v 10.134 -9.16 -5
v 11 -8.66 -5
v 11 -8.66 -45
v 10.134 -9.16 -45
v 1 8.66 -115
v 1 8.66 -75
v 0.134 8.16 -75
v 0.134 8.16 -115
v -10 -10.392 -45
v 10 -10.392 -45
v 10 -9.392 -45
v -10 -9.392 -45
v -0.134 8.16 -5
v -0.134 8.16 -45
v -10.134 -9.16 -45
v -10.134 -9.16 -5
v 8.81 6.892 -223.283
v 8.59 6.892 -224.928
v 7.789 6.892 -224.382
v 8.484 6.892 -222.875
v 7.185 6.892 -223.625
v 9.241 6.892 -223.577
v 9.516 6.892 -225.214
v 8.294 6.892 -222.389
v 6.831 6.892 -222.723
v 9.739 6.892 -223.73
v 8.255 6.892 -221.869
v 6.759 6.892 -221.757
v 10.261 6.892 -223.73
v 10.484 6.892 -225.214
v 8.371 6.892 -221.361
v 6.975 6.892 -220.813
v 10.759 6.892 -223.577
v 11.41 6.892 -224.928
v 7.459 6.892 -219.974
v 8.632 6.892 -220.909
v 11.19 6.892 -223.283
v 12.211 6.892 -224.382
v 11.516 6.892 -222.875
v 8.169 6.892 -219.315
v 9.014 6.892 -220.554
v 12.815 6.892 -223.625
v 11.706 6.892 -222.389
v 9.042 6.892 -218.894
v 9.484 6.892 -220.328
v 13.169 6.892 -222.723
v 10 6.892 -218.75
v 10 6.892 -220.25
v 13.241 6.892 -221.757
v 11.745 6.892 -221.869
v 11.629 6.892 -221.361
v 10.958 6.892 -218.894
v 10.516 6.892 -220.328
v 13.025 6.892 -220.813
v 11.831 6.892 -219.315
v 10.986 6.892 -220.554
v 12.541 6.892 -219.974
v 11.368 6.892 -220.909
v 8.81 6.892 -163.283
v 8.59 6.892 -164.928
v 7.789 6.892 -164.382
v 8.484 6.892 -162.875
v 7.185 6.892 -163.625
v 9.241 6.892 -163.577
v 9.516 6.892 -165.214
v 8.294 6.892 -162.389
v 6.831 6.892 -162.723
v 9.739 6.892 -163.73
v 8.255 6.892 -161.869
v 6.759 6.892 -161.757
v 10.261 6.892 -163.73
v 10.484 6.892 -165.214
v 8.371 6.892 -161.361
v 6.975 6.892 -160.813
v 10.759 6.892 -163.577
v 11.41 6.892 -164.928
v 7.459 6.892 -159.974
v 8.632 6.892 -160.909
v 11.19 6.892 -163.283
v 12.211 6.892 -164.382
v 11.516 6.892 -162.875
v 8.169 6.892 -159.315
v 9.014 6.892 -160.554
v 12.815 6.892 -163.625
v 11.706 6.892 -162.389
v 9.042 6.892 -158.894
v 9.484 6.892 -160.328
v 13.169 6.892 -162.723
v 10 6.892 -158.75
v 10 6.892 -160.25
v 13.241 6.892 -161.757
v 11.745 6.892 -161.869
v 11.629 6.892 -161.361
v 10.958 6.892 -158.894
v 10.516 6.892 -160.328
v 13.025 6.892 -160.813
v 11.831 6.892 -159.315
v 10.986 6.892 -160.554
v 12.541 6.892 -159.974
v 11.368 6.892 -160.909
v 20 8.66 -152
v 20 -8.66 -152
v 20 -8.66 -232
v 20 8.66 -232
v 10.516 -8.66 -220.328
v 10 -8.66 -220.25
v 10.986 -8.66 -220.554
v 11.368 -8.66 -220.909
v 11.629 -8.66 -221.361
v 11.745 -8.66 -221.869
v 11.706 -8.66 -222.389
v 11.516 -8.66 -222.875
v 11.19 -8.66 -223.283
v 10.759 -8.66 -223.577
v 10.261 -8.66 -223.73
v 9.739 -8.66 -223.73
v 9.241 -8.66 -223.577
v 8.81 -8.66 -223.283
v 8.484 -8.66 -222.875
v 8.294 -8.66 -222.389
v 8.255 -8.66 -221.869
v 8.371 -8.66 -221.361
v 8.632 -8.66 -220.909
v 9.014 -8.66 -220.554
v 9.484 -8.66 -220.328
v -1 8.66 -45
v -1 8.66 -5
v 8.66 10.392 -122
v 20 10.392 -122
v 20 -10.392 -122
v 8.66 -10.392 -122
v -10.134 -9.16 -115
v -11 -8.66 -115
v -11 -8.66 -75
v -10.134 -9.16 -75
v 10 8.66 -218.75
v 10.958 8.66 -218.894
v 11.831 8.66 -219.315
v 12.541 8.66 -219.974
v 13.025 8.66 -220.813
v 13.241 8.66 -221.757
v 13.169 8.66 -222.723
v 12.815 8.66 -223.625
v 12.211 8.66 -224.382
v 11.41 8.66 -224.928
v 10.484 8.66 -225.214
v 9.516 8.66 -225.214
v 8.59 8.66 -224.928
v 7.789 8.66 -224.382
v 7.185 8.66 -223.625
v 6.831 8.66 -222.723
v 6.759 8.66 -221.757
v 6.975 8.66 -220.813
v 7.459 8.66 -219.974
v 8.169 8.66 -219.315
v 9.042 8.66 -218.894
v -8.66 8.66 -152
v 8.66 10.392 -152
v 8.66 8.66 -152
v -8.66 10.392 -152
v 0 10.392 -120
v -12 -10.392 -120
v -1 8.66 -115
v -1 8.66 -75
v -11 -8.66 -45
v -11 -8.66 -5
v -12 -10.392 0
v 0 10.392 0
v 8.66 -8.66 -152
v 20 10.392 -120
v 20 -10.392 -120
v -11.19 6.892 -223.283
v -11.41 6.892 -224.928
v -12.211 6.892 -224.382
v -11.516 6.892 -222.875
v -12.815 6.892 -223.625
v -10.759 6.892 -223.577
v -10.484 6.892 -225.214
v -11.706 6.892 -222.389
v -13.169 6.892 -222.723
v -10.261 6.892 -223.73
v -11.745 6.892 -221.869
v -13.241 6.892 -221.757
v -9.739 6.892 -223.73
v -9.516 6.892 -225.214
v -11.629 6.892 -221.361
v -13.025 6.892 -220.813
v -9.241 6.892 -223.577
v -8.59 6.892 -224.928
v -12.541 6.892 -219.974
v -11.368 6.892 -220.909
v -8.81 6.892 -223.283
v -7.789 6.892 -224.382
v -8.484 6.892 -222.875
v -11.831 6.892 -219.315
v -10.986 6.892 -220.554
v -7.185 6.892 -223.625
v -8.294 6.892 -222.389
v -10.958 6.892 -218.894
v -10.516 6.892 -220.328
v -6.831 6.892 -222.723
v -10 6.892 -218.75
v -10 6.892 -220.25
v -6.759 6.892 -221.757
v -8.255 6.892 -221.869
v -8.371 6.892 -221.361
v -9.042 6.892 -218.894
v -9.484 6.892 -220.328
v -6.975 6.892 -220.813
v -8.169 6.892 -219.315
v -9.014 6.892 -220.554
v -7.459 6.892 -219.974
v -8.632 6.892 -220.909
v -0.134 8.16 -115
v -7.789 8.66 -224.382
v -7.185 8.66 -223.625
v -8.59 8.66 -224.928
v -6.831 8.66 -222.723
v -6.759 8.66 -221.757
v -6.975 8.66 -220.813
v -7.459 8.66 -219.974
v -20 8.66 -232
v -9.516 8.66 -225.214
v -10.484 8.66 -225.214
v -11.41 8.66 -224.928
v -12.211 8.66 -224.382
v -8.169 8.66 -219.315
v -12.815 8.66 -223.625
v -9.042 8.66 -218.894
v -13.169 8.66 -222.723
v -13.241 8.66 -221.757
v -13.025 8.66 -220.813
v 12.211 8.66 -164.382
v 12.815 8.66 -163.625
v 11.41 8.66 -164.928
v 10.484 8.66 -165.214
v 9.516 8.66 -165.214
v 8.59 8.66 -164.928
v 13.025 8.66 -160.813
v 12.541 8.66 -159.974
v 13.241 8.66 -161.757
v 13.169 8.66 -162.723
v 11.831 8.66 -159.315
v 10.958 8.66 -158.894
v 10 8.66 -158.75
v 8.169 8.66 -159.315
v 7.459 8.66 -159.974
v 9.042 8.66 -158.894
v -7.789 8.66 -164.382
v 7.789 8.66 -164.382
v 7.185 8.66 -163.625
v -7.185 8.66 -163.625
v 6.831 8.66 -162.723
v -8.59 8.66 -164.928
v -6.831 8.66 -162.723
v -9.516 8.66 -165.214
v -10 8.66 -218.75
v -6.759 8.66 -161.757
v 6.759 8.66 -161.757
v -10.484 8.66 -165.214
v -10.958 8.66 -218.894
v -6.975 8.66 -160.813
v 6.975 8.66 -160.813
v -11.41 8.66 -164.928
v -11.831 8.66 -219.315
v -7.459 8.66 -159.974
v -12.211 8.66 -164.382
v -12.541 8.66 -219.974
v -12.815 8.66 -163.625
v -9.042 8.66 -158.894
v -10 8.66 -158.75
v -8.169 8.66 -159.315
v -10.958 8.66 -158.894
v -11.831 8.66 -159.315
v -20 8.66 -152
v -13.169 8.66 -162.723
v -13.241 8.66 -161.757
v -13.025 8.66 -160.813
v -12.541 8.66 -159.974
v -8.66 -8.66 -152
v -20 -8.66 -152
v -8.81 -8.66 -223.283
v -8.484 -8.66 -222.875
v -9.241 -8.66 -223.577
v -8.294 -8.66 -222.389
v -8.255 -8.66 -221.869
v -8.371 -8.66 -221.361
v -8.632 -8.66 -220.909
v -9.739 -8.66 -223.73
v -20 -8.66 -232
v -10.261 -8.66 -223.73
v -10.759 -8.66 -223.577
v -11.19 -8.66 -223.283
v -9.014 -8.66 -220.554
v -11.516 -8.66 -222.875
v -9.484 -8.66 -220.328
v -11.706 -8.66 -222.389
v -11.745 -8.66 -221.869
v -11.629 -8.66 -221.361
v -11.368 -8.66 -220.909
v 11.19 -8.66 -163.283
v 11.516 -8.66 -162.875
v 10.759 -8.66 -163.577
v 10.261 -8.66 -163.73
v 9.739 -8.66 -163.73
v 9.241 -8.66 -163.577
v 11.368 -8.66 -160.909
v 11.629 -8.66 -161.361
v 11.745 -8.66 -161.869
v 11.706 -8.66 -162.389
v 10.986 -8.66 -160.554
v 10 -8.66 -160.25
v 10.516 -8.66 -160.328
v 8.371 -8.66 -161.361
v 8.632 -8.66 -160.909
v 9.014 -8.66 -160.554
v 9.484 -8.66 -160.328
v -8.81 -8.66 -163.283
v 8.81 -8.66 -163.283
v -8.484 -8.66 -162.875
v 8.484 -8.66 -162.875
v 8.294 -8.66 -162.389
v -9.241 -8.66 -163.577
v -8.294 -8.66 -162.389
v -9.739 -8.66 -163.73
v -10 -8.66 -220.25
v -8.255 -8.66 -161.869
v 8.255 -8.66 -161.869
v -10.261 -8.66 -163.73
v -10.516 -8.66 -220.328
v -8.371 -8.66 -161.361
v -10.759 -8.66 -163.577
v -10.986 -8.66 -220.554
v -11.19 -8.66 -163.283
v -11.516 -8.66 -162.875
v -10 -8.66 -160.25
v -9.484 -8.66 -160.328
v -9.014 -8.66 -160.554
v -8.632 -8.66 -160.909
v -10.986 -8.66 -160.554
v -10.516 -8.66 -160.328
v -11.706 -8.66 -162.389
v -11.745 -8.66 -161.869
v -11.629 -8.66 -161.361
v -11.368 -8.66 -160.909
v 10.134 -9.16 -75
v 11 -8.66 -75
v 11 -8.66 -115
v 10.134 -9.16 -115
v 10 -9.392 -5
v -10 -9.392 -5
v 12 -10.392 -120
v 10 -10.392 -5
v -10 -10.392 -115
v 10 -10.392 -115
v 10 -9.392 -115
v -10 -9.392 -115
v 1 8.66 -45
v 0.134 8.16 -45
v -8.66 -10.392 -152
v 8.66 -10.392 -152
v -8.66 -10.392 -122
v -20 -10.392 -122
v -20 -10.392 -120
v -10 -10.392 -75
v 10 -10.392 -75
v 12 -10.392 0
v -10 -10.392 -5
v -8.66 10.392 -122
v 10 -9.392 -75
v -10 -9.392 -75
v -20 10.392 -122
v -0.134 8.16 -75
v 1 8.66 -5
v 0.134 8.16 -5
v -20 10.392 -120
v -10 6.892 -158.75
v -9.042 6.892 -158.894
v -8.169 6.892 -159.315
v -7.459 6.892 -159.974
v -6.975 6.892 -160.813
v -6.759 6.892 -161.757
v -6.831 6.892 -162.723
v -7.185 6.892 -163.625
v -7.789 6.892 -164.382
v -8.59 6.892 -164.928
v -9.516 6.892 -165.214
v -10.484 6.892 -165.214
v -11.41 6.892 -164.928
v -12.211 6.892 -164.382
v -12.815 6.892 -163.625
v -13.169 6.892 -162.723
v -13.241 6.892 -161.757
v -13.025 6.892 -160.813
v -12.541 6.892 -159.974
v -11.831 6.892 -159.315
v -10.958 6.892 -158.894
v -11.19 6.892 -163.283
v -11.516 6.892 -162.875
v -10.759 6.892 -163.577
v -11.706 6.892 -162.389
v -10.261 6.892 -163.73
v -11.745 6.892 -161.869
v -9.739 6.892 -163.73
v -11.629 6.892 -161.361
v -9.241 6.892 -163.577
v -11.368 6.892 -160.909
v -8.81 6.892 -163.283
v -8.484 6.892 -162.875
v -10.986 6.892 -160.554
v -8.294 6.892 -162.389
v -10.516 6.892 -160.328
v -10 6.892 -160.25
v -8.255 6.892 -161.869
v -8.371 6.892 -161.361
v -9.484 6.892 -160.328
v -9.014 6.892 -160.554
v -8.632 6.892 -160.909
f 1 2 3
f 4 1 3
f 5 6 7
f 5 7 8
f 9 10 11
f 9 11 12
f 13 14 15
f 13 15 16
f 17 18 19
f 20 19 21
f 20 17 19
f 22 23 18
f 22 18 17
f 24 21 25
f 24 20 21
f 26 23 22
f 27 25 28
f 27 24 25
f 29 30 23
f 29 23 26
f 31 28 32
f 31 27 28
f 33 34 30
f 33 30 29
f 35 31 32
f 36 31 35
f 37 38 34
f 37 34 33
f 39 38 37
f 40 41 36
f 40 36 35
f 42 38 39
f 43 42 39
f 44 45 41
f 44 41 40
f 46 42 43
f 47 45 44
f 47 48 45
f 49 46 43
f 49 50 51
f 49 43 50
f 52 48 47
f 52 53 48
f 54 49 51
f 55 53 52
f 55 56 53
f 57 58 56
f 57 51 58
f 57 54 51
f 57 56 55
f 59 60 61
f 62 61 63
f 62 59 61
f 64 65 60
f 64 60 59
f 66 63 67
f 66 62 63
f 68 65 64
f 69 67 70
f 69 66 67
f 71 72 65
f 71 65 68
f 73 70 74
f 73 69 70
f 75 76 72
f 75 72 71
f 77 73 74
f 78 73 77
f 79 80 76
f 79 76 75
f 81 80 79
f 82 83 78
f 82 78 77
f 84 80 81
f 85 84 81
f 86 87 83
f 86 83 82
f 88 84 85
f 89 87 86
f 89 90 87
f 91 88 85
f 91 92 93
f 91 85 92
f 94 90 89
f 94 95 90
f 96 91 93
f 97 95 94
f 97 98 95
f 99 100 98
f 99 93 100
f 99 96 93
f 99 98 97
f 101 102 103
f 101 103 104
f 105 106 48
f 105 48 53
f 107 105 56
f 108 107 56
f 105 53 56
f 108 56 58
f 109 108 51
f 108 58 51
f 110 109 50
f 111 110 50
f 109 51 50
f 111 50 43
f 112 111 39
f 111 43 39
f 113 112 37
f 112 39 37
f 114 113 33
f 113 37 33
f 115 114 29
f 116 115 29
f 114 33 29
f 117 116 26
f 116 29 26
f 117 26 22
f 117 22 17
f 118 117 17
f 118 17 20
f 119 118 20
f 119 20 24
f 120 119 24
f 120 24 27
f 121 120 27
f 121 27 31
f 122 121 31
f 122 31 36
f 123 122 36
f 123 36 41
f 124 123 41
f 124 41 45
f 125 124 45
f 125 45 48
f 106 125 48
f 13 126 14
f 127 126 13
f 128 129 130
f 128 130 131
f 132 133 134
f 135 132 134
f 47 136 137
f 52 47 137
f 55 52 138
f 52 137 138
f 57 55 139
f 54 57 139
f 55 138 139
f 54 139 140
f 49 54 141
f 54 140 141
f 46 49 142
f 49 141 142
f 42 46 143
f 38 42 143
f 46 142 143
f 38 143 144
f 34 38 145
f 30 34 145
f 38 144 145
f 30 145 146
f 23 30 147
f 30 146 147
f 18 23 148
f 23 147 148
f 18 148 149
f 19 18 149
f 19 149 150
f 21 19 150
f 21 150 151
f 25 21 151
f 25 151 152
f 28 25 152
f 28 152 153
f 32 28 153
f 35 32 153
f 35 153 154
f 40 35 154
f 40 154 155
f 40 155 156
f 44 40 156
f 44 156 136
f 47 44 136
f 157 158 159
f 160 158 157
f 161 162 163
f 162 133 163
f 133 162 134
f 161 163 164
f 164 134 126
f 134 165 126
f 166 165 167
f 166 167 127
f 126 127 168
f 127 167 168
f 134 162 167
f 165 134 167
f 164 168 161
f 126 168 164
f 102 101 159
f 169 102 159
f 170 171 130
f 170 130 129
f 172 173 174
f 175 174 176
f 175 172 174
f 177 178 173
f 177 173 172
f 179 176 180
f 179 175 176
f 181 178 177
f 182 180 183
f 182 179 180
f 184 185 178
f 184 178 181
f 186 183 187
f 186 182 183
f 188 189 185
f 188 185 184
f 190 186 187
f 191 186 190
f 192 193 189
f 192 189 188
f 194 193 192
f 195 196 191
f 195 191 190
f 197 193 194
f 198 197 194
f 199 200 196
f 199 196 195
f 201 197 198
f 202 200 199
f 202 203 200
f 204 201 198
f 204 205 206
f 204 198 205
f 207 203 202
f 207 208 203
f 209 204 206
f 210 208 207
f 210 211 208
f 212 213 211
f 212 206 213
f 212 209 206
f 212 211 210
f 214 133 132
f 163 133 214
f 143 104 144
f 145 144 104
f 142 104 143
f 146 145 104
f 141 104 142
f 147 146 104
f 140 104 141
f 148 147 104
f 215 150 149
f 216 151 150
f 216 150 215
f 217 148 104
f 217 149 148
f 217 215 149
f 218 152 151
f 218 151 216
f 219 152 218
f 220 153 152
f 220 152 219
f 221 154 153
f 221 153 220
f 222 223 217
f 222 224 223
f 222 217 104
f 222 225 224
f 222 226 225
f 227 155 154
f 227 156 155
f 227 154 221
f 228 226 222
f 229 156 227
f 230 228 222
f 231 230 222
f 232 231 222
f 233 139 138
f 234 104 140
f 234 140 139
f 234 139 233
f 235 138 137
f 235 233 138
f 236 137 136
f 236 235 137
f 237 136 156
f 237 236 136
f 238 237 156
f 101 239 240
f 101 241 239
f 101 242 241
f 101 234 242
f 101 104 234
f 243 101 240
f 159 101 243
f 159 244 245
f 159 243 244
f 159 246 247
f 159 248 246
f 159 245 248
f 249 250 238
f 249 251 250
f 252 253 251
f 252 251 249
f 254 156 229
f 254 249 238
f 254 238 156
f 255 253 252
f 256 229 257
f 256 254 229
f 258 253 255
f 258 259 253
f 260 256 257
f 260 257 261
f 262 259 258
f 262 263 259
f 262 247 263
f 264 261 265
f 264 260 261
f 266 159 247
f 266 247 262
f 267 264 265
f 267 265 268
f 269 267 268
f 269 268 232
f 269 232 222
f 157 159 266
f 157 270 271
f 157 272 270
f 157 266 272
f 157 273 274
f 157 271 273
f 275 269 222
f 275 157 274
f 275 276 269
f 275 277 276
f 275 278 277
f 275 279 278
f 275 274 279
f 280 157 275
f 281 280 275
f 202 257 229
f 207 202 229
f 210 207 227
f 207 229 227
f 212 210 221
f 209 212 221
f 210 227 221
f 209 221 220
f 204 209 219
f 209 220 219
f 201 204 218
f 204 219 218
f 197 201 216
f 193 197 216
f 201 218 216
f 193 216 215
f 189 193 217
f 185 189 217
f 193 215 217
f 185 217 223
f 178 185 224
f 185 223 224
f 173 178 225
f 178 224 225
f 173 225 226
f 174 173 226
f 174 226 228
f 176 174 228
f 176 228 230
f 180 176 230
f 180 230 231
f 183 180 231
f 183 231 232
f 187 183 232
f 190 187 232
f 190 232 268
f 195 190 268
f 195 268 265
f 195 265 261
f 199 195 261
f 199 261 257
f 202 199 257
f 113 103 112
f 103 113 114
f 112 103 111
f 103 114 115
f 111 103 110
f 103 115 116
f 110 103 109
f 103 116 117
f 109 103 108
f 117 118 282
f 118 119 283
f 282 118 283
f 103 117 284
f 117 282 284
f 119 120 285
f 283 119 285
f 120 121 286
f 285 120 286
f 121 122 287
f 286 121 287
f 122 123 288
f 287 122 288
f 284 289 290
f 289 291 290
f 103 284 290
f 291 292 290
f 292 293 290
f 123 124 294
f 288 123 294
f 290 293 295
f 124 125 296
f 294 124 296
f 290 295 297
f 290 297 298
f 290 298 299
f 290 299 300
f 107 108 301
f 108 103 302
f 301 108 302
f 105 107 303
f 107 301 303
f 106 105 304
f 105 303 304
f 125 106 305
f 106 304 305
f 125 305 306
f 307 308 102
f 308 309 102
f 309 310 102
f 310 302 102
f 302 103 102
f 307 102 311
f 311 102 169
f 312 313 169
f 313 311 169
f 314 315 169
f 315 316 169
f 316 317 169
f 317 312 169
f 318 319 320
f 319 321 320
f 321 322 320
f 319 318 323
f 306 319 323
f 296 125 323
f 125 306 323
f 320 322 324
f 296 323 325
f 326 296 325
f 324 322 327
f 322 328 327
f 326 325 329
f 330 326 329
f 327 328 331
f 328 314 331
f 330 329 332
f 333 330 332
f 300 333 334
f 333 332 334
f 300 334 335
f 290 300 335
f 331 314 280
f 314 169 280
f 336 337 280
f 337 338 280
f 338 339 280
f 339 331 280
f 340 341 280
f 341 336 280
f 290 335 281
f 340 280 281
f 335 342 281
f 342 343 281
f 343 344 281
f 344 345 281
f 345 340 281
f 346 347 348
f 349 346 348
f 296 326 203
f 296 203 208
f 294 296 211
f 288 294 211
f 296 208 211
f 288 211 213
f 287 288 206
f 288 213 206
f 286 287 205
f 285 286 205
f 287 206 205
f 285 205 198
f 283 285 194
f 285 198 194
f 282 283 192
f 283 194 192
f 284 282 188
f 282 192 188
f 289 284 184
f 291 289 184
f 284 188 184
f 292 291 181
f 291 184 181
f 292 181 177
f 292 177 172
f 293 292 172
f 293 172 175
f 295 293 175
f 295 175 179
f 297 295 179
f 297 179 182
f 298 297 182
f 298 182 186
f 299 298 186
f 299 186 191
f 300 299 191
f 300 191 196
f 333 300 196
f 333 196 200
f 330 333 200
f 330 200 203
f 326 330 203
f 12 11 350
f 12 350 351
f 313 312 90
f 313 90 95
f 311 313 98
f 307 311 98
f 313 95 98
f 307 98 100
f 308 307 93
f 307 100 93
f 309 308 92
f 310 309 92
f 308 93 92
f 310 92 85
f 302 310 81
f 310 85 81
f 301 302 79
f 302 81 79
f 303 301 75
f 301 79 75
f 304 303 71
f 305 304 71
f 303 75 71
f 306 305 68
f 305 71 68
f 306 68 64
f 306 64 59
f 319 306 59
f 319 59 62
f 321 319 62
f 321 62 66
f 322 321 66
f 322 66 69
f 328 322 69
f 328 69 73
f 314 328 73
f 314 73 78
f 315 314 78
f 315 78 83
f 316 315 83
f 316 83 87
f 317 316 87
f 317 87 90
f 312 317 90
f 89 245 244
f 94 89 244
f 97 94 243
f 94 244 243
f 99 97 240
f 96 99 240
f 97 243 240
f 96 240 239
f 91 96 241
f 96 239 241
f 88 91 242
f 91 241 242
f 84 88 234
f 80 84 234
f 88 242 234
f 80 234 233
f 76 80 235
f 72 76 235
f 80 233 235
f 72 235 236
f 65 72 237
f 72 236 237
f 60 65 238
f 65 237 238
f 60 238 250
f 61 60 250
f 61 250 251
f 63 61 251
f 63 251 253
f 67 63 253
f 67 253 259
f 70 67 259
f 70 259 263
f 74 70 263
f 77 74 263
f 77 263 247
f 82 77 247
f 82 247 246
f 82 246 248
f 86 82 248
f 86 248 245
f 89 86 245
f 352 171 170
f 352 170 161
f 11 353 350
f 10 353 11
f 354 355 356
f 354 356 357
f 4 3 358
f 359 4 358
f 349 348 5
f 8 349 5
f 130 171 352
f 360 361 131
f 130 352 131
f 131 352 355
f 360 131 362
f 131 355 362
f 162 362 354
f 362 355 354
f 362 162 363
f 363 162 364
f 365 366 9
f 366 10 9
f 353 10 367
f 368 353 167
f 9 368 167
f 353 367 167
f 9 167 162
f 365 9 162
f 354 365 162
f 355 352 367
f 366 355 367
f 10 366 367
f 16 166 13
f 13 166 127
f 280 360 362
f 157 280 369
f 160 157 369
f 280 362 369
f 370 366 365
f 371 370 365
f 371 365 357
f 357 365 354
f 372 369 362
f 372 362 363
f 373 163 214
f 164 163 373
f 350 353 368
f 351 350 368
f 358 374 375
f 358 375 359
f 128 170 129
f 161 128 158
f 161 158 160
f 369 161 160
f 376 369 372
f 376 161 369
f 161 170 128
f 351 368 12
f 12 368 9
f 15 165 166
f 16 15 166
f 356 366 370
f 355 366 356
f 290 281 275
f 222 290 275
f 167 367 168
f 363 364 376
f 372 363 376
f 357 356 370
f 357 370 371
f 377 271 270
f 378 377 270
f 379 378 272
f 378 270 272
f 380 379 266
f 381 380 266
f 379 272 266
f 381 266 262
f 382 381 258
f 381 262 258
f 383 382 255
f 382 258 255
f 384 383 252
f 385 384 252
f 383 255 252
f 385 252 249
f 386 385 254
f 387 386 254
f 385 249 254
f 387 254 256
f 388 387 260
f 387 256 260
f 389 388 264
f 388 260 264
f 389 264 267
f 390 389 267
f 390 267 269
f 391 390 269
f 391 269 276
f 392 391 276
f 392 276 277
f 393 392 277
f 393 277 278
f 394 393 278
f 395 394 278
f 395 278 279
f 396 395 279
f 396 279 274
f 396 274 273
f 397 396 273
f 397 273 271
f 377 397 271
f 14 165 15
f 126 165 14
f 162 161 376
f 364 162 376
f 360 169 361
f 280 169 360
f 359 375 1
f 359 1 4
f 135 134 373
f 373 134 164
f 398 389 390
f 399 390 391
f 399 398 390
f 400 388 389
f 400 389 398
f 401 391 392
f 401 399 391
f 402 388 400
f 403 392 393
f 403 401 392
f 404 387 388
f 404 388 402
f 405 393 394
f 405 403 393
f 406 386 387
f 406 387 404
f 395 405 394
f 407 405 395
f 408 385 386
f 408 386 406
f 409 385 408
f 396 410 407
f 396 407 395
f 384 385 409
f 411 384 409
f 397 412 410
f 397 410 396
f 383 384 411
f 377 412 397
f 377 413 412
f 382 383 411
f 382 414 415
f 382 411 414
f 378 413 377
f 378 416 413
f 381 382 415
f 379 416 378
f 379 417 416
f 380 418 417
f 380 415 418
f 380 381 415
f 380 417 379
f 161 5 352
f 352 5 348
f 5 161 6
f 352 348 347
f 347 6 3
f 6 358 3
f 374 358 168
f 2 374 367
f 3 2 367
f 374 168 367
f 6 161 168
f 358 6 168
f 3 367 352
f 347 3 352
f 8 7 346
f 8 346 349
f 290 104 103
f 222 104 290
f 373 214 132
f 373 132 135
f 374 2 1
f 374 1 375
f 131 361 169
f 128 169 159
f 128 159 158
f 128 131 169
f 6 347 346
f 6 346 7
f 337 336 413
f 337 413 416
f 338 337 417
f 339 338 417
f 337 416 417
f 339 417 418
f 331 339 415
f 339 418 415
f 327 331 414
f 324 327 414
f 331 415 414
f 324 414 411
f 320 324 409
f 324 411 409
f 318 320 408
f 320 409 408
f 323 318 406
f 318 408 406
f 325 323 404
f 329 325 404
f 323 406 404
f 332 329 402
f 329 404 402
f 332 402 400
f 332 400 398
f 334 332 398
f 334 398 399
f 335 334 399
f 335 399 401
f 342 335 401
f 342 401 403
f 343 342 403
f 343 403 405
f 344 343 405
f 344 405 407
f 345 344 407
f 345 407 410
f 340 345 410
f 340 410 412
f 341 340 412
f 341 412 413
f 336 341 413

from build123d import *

# Parameters (mm, degrees)
EXTRUDE_2_DEPTH     = 120
SKETCH_3_W          = 40
SKETCH_3_H          = 20.78460969
EXTRUDE_3_DEPTH     = 2
SKETCH_4_W          = 17.320508076
SKETCH_4_H          = 20.78460969
EXTRUDE_4_DEPTH     = 30
SKETCH_5_W          = 40
SKETCH_5_H          = 17.320508076
EXTRUDE_5_DEPTH     = 80
SKETCH_6_R          = 1.75
CUT_EXTRUDE_1_DEPTH = 234.786227139
SKETCH_7_R          = 3.25
CUT_EXTRUDE_2_DEPTH = 3.5
SKETCH_8_W          = 40
SKETCH_8_H          = 20
CUT_EXTRUDE_3_DEPTH = 1
SKETCH_10_W         = 40
SKETCH_10_H         = 20
CUT_EXTRUDE_4_DEPTH = 1
SKETCH_11_W         = 20
SKETCH_11_H         = 40
CUT_EXTRUDE_5_DEPTH = 1


with BuildPart() as part:
    # ｽｹｯﾁ2 → ﾎﾞｽ - 押し出し2 (new body)
    with BuildSketch(Plane(origin=(0, 0, 0), x_dir=(-1, 0, 0), z_dir=(0, 0, -1))):
        Polygon((12, -10.392304845), (0, 10.392304845), (-12, -10.392304845), align=None)
    extrude(amount=EXTRUDE_2_DEPTH)

    # ｽｹｯﾁ3 → ﾎﾞｽ - 押し出し3 (add)
    with BuildSketch(Plane(origin=(0, 0, -120), x_dir=(-1, 0, 0), z_dir=(0, 0, -1))):
        Rectangle(SKETCH_3_W, SKETCH_3_H)
    extrude(amount=EXTRUDE_3_DEPTH)

    # ｽｹｯﾁ4 → ﾎﾞｽ - 押し出し4 (add)
    with BuildSketch(Plane(origin=(0, 0, -122), x_dir=(-1, 0, 0), z_dir=(0, 0, -1))):
        Rectangle(SKETCH_4_W, SKETCH_4_H)
    extrude(amount=EXTRUDE_4_DEPTH)

    # ｽｹｯﾁ5 → ﾎﾞｽ - 押し出し5 (add)
    with BuildSketch(Plane(origin=(0, 0, -152), x_dir=(-1, 0, 0), z_dir=(0, 0, -1))):
        Rectangle(SKETCH_5_W, SKETCH_5_H)
    extrude(amount=EXTRUDE_5_DEPTH)

    # ｽｹｯﾁ6 → ｶｯﾄ - 押し出し1 (cut, through all)
    with BuildSketch(Plane(origin=(0, 10.392304845, 0), x_dir=(1, 0, 0), z_dir=(0, 1, 0))):
        with Locations(Location((-10, 162, 0), (0, 0, 270))):
            Circle(SKETCH_6_R)
        with Locations(Location((10, 162, 0), (0, 0, 270))):
            Circle(SKETCH_6_R)
        with Locations(Location((-10, 222, 0), (0, 0, 270))):
            Circle(SKETCH_6_R)
        with Locations(Location((10, 222, 0), (0, 0, 270))):
            Circle(SKETCH_6_R)
    extrude(amount=-CUT_EXTRUDE_1_DEPTH, mode=Mode.SUBTRACT)

    # ｽｹｯﾁ7 → ｶｯﾄ - 押し出し2 (cut)
    with BuildSketch(Plane(origin=(0, 10.392304845, 0), x_dir=(1, 0, 0), z_dir=(0, 1, 0))):
        with Locations(Location((-10, 162, 0), (0, 0, 270))):
            Circle(SKETCH_7_R)
        with Locations(Location((-10, 222, 0), (0, 0, 270))):
            Circle(SKETCH_7_R)
        with Locations(Location((10, 222, 0), (0, 0, 270))):
            Circle(SKETCH_7_R)
        with Locations(Location((10, 162, 0), (0, 0, 270))):
            Circle(SKETCH_7_R)
    extrude(amount=-CUT_EXTRUDE_2_DEPTH, mode=Mode.SUBTRACT)

    # ｽｹｯﾁ8 → ｶｯﾄ - 押し出し3 (cut)
    with BuildSketch(Plane(origin=(-4.5, 2.598076211, 0), x_dir=(0, 0, 1), z_dir=(-0.8660254037844386, 0.5000000000000001, 0))):
        with Locations((-95, -3)):
            Rectangle(SKETCH_8_W, SKETCH_8_H)
        with Locations((-25, -3)):
            Rectangle(SKETCH_8_W, SKETCH_8_H)
    extrude(amount=-CUT_EXTRUDE_3_DEPTH, mode=Mode.SUBTRACT)

    # ｽｹｯﾁ10 → ｶｯﾄ - 押し出し4 (cut)
    with BuildSketch(Plane(origin=(4.5, 2.598076211, 0), x_dir=(0, 0, -1), z_dir=(0.8660254037844387, 0.5000000000000001, 0))):
        with Locations((25, -3)):
            Rectangle(SKETCH_10_W, SKETCH_10_H)
        with Locations((95, -3)):
            Rectangle(SKETCH_10_W, SKETCH_10_H)
    extrude(amount=-CUT_EXTRUDE_4_DEPTH, mode=Mode.SUBTRACT)

    # ｽｹｯﾁ11 → ｶｯﾄ - 押し出し5 (cut)
    with BuildSketch(Plane(origin=(0, -10.392304845, 0), x_dir=(-1, 0, 0), z_dir=(0, -1, 0))):
        with Locations((0, 25)):
            Rectangle(SKETCH_11_W, SKETCH_11_H)
        with Locations((0, 95)):
            Rectangle(SKETCH_11_W, SKETCH_11_H)
    extrude(amount=-CUT_EXTRUDE_5_DEPTH, mode=Mode.SUBTRACT)


solid = part.part
